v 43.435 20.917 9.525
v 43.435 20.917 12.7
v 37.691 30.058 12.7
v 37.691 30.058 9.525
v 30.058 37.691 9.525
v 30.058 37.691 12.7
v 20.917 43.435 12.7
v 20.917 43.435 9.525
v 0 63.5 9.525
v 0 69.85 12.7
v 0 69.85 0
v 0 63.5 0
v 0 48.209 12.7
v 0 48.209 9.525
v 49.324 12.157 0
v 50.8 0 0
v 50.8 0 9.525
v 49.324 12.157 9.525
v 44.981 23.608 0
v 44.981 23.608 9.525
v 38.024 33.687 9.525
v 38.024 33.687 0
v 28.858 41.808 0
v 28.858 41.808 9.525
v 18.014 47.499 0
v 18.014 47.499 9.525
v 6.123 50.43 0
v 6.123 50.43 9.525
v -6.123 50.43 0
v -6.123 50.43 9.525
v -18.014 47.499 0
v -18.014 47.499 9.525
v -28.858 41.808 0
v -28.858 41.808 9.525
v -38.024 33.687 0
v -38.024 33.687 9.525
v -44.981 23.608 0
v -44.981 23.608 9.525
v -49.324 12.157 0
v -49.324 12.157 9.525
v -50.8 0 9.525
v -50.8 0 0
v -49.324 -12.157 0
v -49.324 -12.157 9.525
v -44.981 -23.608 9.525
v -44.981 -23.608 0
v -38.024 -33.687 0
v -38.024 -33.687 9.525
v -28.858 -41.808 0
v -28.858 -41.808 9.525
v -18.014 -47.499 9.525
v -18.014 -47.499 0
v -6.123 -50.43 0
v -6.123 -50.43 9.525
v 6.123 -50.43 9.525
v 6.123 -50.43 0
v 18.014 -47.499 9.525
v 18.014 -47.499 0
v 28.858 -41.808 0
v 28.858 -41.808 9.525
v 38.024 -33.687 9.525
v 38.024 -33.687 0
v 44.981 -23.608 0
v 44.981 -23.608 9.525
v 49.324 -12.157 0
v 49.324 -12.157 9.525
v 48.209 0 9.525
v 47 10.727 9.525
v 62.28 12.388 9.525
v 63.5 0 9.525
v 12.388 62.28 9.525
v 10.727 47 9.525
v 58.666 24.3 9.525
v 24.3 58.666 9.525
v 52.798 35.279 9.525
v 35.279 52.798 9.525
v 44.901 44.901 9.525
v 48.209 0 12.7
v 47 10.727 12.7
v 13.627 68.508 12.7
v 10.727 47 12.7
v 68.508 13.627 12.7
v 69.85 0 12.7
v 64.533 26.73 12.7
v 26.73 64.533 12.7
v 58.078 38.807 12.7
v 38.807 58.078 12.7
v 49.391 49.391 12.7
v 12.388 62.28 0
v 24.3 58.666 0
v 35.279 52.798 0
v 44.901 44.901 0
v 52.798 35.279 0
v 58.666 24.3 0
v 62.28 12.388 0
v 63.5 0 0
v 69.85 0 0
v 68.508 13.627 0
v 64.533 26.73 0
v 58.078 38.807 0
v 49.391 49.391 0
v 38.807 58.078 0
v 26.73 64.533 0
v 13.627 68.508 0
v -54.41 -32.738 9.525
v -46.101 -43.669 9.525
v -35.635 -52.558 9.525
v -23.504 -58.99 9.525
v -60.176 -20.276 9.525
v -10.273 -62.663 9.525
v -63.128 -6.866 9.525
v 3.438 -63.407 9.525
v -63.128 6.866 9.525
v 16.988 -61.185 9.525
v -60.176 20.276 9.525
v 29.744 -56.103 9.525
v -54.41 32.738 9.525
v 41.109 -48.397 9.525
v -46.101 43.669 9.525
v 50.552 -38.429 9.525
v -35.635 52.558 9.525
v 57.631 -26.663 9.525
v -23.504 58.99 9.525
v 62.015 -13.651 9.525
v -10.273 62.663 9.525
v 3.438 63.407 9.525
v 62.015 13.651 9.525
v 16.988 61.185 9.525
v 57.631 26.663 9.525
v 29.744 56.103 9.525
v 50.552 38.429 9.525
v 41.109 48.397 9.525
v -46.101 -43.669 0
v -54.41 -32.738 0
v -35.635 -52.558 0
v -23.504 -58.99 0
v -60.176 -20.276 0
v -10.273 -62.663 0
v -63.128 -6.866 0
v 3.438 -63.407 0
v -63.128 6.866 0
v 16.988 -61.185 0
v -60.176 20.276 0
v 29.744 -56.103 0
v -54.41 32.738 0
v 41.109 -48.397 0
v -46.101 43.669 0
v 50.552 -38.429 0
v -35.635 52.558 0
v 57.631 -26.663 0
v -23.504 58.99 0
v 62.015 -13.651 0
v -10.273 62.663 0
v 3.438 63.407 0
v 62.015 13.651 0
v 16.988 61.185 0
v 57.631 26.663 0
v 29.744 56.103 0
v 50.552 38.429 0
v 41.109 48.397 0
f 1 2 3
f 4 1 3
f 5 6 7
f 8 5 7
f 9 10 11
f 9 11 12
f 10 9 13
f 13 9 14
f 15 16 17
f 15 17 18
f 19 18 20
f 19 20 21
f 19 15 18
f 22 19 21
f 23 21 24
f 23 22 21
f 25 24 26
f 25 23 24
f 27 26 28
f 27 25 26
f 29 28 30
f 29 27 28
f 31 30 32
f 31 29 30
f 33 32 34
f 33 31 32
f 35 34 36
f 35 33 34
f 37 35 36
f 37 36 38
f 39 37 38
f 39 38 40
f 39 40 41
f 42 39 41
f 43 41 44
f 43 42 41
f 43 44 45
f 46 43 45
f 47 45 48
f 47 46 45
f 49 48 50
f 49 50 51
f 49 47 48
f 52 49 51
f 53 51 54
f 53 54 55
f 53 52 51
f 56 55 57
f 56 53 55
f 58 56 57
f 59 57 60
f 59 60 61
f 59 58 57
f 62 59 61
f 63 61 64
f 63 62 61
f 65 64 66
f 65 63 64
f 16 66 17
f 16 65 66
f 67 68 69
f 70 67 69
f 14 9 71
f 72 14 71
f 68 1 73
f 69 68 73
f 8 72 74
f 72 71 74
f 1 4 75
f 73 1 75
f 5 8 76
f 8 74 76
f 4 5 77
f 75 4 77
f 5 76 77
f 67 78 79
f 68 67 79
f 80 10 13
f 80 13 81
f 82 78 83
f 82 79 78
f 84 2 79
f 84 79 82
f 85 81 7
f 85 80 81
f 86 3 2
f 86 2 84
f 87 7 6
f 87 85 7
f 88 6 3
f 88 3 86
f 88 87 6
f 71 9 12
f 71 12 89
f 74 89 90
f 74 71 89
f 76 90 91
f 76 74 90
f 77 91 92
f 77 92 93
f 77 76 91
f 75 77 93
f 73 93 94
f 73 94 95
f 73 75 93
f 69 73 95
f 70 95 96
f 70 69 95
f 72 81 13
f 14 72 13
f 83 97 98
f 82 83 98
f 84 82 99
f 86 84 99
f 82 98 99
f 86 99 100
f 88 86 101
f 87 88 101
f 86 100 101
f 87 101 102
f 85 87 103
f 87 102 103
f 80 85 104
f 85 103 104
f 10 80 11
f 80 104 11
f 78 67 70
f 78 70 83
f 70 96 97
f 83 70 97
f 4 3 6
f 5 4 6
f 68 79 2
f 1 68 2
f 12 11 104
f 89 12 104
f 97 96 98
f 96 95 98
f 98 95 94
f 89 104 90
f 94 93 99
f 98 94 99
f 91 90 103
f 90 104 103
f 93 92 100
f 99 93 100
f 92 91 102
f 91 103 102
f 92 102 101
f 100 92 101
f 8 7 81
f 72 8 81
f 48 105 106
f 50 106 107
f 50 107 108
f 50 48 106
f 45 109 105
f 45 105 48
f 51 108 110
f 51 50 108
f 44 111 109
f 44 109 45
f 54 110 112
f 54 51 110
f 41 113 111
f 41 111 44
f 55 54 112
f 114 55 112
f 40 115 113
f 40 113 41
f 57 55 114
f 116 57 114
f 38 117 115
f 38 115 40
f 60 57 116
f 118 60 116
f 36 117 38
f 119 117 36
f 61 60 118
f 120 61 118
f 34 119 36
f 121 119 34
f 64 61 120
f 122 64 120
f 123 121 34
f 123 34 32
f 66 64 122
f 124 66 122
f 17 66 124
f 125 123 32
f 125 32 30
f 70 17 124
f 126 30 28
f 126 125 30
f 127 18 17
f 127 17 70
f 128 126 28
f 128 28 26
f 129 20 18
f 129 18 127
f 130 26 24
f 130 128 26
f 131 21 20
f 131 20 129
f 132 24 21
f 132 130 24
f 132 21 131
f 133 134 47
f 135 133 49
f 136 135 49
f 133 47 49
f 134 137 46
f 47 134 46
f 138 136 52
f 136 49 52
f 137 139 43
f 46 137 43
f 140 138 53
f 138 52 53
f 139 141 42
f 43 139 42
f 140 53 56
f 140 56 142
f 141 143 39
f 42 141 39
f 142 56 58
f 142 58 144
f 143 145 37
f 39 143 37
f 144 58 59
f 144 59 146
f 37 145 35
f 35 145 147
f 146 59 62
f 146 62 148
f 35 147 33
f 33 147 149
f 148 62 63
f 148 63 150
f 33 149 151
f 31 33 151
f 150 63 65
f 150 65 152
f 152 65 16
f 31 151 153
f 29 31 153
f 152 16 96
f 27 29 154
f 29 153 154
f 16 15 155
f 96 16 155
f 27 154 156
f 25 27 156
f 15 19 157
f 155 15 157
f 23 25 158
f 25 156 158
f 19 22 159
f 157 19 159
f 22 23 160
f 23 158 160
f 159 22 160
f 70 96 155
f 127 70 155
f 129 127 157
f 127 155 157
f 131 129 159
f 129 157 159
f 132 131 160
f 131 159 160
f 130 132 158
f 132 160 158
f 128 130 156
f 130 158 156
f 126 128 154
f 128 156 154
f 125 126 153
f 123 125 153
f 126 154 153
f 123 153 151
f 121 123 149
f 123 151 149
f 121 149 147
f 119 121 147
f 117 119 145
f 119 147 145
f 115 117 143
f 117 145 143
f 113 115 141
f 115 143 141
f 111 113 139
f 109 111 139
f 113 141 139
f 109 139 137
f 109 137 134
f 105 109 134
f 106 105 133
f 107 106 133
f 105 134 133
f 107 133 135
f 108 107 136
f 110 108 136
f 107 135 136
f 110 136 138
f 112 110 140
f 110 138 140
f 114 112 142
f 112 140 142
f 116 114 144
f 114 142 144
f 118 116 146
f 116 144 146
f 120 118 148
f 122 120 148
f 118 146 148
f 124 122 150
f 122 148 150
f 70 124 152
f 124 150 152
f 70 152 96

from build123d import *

# Parameters (mm, degrees)
F0_R     = 50.8
F1_DEPTH = 9.525
F2_R     = 63.5
F3_DEPTH = 9.525
F6_DEPTH = 9.525
F7_DEPTH = 3.175
F9_DEPTH = 25.4


# Not quite as in the source:
# - a length typed as a fraction of an inch, garbled in the dataset ("3 / 203.2 mm" for 3/8 in), is restored


with BuildPart() as f1:
    # F0 (on Top) → F1 (new body)
    with BuildSketch(Plane.XY):
        Circle(F0_R)
    extrude(amount=F1_DEPTH)


with BuildPart() as f3:
    # F2 (on Top) → F3 (new body)
    with BuildSketch(Plane.XY):
        Circle(F2_R)
    extrude(amount=F3_DEPTH)

    # F4: cut F1
    add(f1.part, mode=Mode.SUBTRACT)


with BuildPart() as f6:
    # F5 (on face) → F6 (new body)
    with BuildSketch(Plane.XY.offset(9.525)):
        with BuildLine():
            Line((63.5, 0), (69.85, 0))
            ThreePointArc((69.85, 0), (49.3914086659, 49.3914086659), (0, 69.85))
            Line((0, 69.85), (0, 63.5))
            ThreePointArc((0, 63.5), (44.9012806053, 44.9012806053), (63.5, 0))
        make_face()
    extrude(amount=-F6_DEPTH)

    # F5 (on face) → F7 (join)
    with BuildSketch(Plane.XY.offset(9.525)):
        with BuildLine():
            Line((63.5, 0), (69.85, 0))
            ThreePointArc((69.85, 0), (49.3914086659, 49.3914086659), (0, 69.85))
            Line((0, 69.85), (0, 63.5))
            ThreePointArc((0, 63.5), (44.9012806053, 44.9012806053), (63.5, 0))
        make_face()
        with BuildLine():
            Line((30.1279164851, 0), (63.5, 0))
            ThreePointArc((63.5, 0), (44.9012806053, 44.9012806053), (0, 63.5))
            Line((0, 63.5), (0, 30.1279164851))
            ThreePointArc((0, 30.1279164851), (21.3036540496, 21.3036540496), (30.1279164851, 0))
        make_face()
    extrude(amount=F7_DEPTH)

    # F8 (on face) → F9 (cut)
    with BuildSketch(Plane.XY.offset(12.7)):
        Polygon((47.0000967019, -10.7274653679), (48.2087917626, 0), (47.0000967019, 10.7274653679), (43.4346205373, 20.9170108283), (37.6911511317, 30.0576900239), (30.0576900239, 37.6911511317), (20.9170108283, 43.4346205373), (10.7274653679, 47.0000967019), (0, 48.2087917626), (-10.7274653679, 47.0000967019), (-20.9170108283, 43.4346205373), (-30.0576900239, 37.6911511317), (-37.6911511317, 30.0576900239), (-43.4346205373, 20.9170108283), (-47.0000967019, 10.7274653679), (-48.2087917626, 0), (-47.0000967019, -10.7274653679), (-43.4346205373, -20.9170108283), (-37.6911511317, -30.0576900239), (-30.0576900239, -37.6911511317), (-20.9170108283, -43.4346205373), (-10.7274653679, -47.0000967019), (0, -48.2087917626), (10.7274653679, -47.0000967019), (20.9170108283, -43.4346205373), (30.0576900239, -37.6911511317), (37.6911511317, -30.0576900239), (43.4346205373, -20.9170108283), align=None)
    extrude(amount=-F9_DEPTH, mode=Mode.SUBTRACT)


solid = Compound([f3.part, f6.part])
